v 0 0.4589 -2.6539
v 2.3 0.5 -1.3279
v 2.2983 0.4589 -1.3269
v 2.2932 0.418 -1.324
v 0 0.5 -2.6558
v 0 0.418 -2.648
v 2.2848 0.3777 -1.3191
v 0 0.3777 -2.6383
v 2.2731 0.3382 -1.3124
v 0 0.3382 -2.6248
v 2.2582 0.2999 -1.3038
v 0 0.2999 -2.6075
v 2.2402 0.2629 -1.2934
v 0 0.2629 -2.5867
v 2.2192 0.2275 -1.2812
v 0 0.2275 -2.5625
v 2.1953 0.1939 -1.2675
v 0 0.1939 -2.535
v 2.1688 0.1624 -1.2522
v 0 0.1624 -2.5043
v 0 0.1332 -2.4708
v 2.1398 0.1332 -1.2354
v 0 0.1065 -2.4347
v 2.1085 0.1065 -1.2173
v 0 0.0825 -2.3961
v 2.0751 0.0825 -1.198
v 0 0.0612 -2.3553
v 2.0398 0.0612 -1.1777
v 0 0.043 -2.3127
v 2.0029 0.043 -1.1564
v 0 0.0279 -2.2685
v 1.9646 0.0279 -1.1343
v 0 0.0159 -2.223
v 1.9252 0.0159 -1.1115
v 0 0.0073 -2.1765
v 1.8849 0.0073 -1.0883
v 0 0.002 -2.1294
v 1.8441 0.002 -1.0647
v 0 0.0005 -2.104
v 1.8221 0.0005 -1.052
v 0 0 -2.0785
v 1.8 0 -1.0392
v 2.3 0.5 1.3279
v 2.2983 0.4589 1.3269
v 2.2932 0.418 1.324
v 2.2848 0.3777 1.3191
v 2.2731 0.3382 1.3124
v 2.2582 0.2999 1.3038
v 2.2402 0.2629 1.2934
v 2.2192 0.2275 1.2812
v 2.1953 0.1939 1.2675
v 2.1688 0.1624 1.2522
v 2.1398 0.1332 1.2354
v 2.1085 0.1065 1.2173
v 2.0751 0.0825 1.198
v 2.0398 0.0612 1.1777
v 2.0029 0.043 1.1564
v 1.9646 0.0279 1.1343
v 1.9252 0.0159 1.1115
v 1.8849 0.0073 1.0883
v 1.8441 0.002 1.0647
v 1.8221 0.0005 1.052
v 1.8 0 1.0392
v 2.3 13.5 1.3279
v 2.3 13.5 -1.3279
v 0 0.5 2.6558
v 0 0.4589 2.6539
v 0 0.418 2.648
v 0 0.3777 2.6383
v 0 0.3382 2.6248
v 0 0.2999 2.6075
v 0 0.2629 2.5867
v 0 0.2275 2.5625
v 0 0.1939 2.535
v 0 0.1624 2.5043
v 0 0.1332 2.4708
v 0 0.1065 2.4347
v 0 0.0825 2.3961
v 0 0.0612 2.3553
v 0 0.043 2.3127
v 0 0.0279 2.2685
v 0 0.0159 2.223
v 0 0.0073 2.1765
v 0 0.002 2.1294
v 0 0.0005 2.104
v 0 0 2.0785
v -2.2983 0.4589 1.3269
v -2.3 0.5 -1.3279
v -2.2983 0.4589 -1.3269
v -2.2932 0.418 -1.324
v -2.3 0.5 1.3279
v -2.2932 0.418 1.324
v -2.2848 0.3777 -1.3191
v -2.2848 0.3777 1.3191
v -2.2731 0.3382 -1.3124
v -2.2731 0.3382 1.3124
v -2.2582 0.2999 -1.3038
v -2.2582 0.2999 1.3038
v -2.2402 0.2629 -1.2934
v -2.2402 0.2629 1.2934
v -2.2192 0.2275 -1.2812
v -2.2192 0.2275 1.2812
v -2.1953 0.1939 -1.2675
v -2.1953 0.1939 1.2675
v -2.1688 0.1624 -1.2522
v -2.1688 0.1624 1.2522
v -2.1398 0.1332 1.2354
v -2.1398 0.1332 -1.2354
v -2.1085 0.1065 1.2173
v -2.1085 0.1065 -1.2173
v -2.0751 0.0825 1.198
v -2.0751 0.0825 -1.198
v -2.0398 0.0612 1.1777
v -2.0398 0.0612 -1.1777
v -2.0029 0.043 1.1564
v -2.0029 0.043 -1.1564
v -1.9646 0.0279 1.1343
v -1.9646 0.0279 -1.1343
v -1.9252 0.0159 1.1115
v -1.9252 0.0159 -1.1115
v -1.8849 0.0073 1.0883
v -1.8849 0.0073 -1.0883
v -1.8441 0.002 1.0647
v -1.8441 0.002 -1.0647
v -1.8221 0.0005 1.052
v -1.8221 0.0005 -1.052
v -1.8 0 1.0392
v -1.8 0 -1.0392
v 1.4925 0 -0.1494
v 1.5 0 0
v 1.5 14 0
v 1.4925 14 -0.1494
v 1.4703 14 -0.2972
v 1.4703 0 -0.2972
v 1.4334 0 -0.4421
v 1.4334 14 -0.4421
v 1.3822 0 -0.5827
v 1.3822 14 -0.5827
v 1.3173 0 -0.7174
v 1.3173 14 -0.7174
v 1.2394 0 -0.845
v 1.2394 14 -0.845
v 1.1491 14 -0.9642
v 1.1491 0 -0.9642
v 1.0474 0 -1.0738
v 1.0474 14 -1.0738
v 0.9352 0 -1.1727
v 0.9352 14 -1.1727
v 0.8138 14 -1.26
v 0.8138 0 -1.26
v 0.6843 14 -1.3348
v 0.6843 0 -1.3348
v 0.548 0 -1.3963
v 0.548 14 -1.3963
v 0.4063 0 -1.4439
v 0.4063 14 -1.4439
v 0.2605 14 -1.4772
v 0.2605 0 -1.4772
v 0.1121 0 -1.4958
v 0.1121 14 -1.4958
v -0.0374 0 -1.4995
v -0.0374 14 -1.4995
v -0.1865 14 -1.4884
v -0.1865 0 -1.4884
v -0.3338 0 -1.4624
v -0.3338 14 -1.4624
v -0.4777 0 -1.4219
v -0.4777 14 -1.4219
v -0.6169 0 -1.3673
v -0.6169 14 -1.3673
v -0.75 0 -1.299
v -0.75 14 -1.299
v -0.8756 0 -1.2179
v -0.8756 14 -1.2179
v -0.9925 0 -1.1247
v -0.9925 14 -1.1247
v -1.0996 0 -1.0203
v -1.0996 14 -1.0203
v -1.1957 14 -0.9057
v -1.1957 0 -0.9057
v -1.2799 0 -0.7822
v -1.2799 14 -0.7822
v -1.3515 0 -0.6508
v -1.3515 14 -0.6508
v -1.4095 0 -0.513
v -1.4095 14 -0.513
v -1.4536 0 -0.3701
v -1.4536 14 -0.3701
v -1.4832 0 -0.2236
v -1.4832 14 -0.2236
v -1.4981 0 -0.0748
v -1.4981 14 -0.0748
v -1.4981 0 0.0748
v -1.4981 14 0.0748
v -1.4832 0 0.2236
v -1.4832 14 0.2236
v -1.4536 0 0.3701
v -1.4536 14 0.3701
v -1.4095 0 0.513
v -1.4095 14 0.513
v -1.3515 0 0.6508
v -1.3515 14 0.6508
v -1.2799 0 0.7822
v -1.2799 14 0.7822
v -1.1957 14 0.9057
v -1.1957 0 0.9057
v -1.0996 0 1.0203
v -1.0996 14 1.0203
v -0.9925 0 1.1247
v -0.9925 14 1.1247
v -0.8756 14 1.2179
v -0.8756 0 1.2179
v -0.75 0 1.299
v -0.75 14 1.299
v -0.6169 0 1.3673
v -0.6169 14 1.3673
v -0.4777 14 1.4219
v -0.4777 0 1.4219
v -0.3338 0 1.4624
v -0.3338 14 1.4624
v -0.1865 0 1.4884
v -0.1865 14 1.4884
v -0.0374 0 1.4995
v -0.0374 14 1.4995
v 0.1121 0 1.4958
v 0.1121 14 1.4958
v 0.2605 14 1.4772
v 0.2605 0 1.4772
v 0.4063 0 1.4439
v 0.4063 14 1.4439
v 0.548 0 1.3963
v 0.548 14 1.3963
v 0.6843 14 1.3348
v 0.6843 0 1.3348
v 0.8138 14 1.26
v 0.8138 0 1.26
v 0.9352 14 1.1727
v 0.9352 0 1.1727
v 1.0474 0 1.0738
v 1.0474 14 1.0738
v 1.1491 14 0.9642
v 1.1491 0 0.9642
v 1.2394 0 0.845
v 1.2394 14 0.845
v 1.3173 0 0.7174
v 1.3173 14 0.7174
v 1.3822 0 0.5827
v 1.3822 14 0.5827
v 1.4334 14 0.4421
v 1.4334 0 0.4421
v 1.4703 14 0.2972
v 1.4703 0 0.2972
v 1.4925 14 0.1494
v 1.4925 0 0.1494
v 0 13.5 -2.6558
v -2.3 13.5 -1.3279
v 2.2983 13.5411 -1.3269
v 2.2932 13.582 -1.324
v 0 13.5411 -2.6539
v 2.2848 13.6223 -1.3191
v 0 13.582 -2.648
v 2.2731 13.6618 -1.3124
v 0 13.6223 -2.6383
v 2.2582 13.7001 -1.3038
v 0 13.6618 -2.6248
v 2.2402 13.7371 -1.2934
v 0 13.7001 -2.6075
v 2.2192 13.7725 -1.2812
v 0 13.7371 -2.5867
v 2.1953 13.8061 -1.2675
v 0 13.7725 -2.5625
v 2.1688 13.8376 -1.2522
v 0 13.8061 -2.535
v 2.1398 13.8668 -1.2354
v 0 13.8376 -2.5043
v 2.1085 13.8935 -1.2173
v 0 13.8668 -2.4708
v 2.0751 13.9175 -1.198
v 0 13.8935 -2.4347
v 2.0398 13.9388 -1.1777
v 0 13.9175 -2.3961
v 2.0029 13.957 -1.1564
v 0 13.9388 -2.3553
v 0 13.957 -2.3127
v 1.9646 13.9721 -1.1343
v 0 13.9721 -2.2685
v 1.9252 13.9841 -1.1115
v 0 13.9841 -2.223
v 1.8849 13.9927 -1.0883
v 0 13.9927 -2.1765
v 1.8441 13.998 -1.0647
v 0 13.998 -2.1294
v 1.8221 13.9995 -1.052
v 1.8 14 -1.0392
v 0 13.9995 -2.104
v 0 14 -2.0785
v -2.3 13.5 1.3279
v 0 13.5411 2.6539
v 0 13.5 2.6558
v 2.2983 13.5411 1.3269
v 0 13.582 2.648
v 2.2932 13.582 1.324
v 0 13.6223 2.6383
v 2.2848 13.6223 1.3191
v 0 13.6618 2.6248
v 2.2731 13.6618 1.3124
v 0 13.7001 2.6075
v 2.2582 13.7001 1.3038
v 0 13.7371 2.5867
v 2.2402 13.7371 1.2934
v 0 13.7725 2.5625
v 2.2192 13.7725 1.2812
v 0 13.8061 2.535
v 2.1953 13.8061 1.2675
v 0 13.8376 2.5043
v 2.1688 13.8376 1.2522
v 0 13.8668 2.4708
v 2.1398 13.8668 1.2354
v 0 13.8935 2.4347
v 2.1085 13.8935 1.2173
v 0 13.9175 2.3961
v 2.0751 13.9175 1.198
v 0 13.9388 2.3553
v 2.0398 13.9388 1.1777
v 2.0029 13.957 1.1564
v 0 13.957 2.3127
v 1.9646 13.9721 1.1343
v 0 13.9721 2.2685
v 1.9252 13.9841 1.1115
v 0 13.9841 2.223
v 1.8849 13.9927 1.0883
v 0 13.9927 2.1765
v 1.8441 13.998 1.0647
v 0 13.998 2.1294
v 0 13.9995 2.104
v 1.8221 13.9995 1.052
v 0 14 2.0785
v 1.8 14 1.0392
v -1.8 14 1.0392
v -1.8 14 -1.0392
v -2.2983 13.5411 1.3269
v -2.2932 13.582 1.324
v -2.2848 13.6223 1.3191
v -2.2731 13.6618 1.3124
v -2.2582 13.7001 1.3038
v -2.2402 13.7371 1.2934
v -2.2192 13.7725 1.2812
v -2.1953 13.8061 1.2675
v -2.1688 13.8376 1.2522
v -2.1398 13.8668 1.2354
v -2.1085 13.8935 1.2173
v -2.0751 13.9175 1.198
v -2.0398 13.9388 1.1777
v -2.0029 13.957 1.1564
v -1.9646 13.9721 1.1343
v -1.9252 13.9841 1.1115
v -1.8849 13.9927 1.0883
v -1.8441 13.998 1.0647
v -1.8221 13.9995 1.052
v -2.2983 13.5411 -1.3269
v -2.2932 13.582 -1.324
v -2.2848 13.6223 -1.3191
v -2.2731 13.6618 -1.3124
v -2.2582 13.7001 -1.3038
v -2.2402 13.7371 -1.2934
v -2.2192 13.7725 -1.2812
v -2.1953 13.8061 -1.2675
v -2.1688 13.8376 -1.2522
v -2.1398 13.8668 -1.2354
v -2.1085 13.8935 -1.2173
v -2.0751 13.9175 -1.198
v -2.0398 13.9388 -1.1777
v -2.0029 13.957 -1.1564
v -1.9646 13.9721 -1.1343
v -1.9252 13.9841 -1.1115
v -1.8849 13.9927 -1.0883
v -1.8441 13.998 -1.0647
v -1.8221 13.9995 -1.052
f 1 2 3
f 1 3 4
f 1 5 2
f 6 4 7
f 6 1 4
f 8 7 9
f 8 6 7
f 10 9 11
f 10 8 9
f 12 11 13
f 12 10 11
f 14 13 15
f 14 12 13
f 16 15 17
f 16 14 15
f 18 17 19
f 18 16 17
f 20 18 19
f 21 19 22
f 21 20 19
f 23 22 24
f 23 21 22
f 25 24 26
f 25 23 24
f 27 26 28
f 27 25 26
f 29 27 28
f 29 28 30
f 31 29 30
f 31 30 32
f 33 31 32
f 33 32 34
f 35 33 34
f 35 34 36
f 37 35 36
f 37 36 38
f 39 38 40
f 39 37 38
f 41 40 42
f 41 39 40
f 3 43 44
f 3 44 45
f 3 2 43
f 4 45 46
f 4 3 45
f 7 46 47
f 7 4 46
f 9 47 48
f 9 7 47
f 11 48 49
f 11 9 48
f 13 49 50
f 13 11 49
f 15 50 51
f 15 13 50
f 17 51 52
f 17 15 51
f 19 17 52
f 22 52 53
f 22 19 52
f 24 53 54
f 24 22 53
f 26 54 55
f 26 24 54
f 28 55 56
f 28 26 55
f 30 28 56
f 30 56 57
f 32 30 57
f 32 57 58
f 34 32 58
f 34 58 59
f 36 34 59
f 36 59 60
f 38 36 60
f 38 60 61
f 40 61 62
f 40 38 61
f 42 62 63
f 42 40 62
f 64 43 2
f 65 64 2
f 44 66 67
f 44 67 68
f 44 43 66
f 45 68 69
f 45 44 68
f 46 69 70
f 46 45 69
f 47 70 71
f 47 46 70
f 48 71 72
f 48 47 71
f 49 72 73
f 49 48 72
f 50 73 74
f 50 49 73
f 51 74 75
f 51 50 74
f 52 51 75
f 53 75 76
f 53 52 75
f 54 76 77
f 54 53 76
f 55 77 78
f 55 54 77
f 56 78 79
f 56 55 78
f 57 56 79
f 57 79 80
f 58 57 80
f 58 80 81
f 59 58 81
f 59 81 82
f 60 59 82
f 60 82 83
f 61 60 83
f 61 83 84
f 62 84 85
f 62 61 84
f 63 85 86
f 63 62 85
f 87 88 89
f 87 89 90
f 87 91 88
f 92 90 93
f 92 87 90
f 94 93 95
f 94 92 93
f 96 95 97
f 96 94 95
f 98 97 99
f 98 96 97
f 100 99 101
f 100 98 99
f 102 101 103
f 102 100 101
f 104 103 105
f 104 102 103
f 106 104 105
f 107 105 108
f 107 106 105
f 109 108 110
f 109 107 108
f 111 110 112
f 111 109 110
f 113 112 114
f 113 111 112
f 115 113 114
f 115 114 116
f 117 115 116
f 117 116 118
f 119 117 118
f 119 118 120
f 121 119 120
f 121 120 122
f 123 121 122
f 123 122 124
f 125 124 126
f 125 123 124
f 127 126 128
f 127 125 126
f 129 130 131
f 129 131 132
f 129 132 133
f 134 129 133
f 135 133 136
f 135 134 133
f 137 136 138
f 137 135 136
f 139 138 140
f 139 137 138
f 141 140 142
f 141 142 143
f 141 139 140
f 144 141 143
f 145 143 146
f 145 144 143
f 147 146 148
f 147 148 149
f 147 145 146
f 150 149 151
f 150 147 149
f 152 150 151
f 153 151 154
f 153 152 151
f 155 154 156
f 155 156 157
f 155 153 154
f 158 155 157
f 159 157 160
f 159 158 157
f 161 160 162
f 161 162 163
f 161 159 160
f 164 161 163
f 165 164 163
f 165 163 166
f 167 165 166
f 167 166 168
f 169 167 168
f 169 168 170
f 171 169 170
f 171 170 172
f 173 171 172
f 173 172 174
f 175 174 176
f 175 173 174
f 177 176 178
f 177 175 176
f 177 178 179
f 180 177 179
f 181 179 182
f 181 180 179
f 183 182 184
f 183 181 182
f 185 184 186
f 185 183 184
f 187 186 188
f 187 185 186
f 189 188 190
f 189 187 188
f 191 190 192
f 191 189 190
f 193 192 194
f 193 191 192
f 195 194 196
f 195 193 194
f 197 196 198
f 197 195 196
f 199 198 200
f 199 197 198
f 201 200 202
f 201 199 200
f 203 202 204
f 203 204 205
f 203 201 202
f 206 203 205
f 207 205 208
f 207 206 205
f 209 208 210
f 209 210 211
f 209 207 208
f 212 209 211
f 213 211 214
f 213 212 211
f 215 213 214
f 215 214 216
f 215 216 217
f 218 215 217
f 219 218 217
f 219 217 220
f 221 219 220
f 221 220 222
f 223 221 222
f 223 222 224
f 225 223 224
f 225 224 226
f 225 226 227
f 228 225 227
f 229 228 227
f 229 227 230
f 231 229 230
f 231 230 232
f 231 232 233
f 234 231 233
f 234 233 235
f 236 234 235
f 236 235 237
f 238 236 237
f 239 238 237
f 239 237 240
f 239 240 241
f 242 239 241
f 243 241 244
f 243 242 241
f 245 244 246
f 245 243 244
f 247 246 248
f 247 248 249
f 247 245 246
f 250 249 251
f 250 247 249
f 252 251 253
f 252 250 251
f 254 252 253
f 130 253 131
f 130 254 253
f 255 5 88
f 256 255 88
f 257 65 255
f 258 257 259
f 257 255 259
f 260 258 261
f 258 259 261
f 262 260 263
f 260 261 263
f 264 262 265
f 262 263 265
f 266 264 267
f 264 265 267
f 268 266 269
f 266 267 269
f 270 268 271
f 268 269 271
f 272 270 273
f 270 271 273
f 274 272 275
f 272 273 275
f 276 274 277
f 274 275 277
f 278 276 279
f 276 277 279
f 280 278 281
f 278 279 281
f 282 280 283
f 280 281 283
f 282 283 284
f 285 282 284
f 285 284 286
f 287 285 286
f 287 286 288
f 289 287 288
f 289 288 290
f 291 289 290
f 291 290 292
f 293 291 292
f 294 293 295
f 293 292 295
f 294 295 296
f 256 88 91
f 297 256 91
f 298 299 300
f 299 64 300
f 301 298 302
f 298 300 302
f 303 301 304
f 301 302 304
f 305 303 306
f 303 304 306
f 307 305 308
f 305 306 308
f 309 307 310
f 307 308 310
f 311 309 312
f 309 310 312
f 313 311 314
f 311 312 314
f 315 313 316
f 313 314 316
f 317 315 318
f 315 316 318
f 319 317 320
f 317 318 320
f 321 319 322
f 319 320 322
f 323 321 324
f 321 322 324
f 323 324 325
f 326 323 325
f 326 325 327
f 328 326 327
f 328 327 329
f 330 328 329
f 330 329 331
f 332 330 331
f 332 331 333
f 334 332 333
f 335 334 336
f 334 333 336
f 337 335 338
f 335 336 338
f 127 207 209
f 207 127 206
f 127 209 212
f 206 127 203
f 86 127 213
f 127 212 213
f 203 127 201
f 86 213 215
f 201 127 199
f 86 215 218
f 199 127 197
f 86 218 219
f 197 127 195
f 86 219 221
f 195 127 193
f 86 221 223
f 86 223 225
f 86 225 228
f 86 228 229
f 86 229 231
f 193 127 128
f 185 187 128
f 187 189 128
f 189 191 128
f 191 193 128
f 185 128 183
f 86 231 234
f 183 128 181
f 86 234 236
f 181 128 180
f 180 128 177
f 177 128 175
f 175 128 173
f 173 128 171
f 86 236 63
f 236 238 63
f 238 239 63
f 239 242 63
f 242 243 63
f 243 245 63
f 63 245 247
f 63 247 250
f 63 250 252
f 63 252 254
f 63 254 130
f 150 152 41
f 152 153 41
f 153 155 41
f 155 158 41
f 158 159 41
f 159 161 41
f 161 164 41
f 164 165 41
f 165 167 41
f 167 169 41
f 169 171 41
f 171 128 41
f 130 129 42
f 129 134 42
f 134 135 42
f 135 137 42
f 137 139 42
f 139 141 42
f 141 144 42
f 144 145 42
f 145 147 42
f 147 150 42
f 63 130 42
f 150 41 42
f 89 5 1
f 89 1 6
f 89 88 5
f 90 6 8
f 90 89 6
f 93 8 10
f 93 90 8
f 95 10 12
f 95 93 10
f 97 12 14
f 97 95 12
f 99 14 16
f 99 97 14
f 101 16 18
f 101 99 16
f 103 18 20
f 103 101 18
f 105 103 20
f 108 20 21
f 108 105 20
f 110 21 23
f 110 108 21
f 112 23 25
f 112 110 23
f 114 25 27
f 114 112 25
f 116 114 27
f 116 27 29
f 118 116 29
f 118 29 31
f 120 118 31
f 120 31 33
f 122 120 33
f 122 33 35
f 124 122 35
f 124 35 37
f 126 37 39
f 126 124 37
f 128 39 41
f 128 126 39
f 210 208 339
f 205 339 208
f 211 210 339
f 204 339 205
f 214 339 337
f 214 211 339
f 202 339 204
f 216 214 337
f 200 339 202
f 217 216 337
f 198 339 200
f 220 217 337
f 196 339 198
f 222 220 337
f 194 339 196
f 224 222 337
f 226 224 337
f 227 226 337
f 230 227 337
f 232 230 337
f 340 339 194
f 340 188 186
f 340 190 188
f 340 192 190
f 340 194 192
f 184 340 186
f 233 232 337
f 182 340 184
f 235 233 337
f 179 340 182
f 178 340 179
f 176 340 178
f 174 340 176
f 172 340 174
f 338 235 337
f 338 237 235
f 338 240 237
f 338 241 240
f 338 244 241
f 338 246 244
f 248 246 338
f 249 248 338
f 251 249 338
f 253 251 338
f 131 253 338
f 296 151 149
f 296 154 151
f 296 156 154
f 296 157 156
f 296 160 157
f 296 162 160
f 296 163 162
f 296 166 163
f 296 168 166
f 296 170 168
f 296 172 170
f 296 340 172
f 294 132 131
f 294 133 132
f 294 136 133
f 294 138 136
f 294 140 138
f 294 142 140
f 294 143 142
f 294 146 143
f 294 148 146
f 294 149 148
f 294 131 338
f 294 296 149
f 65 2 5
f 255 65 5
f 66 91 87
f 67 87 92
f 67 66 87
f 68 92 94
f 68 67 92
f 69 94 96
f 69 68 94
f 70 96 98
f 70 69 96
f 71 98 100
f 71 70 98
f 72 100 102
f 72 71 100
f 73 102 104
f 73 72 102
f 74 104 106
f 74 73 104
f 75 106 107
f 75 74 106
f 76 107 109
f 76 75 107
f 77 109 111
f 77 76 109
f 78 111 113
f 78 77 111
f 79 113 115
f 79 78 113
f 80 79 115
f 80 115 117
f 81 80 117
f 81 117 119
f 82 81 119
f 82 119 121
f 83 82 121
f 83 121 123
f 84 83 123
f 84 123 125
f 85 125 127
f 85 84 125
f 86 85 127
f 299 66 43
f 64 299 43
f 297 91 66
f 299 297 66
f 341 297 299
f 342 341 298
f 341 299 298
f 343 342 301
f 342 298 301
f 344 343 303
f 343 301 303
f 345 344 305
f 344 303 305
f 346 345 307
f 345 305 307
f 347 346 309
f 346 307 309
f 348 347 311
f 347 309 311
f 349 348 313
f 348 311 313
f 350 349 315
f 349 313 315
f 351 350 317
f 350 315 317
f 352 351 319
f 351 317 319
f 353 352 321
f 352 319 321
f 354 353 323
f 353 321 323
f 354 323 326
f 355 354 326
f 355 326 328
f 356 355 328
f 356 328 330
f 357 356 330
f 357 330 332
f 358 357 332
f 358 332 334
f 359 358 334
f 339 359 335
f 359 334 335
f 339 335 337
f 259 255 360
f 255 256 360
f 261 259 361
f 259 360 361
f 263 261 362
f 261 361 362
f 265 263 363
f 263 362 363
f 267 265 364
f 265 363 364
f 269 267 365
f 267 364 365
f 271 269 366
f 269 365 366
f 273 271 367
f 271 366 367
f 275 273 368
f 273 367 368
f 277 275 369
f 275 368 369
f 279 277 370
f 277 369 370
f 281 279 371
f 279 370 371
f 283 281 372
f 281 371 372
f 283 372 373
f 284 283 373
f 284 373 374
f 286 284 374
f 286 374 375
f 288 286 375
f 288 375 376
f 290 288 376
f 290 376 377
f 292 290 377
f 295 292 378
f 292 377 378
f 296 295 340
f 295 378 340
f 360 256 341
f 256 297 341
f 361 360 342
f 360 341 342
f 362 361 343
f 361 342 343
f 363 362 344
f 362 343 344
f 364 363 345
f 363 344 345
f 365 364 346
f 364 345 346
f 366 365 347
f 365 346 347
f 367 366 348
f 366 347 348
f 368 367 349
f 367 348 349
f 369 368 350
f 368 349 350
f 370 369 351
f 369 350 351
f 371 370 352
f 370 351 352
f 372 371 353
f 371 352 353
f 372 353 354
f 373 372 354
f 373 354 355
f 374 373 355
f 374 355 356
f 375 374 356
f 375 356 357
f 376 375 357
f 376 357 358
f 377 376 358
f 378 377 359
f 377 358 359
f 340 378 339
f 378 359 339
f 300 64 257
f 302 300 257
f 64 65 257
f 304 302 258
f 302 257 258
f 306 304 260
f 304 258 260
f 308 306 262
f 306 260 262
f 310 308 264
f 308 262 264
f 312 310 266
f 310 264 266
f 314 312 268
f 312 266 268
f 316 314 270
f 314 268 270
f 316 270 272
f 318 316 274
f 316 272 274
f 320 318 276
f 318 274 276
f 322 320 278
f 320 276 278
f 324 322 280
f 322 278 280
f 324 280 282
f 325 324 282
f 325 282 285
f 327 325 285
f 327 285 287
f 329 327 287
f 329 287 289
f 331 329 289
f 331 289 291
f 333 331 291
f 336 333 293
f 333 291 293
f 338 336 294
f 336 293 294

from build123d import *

# Parameters (mm, degrees)
SKETCH_1_R      = 1.5
EXTRUDE_1_DEPTH = 14
FILLET_1_R      = 0.5


with BuildPart() as part:
    # 草图1 → 凸台-拉伸1 (new body)
    with BuildSketch(Plane(origin=(0, 0, 0), x_dir=(1, 0, 0), z_dir=(0, 1, 0))):
        Polygon((2.3, -1.327905619), (2.3, 1.327905619), (0, 2.655811238), (-2.3, 1.327905619), (-2.3, -1.327905619), (0, -2.655811238), align=None)
        Circle(SKETCH_1_R, mode=Mode.SUBTRACT)
    extrude(amount=EXTRUDE_1_DEPTH)

    # 圆角1
    fillet_1_edges = [part.edges().sort_by_distance(p)[0] for p in [
        (1.15, 14, -1.991858429),
        (-1.15, 14, -1.991858429),
        (-2.3, 14, 0),
        (-1.15, 14, 1.991858429),
        (1.15, 14, 1.991858429),
        (-1.15, 0, 1.991858429),
        (-2.3, 0, 0),
        (-1.15, 0, -1.991858429),
        (1.15, 0, -1.991858429),
        (2.3, 0, 0),
        (1.15, 0, 1.991858429),
        (2.3, 14, 0),
    ]]
    fillet(fillet_1_edges, radius=FILLET_1_R)


solid = part.part
